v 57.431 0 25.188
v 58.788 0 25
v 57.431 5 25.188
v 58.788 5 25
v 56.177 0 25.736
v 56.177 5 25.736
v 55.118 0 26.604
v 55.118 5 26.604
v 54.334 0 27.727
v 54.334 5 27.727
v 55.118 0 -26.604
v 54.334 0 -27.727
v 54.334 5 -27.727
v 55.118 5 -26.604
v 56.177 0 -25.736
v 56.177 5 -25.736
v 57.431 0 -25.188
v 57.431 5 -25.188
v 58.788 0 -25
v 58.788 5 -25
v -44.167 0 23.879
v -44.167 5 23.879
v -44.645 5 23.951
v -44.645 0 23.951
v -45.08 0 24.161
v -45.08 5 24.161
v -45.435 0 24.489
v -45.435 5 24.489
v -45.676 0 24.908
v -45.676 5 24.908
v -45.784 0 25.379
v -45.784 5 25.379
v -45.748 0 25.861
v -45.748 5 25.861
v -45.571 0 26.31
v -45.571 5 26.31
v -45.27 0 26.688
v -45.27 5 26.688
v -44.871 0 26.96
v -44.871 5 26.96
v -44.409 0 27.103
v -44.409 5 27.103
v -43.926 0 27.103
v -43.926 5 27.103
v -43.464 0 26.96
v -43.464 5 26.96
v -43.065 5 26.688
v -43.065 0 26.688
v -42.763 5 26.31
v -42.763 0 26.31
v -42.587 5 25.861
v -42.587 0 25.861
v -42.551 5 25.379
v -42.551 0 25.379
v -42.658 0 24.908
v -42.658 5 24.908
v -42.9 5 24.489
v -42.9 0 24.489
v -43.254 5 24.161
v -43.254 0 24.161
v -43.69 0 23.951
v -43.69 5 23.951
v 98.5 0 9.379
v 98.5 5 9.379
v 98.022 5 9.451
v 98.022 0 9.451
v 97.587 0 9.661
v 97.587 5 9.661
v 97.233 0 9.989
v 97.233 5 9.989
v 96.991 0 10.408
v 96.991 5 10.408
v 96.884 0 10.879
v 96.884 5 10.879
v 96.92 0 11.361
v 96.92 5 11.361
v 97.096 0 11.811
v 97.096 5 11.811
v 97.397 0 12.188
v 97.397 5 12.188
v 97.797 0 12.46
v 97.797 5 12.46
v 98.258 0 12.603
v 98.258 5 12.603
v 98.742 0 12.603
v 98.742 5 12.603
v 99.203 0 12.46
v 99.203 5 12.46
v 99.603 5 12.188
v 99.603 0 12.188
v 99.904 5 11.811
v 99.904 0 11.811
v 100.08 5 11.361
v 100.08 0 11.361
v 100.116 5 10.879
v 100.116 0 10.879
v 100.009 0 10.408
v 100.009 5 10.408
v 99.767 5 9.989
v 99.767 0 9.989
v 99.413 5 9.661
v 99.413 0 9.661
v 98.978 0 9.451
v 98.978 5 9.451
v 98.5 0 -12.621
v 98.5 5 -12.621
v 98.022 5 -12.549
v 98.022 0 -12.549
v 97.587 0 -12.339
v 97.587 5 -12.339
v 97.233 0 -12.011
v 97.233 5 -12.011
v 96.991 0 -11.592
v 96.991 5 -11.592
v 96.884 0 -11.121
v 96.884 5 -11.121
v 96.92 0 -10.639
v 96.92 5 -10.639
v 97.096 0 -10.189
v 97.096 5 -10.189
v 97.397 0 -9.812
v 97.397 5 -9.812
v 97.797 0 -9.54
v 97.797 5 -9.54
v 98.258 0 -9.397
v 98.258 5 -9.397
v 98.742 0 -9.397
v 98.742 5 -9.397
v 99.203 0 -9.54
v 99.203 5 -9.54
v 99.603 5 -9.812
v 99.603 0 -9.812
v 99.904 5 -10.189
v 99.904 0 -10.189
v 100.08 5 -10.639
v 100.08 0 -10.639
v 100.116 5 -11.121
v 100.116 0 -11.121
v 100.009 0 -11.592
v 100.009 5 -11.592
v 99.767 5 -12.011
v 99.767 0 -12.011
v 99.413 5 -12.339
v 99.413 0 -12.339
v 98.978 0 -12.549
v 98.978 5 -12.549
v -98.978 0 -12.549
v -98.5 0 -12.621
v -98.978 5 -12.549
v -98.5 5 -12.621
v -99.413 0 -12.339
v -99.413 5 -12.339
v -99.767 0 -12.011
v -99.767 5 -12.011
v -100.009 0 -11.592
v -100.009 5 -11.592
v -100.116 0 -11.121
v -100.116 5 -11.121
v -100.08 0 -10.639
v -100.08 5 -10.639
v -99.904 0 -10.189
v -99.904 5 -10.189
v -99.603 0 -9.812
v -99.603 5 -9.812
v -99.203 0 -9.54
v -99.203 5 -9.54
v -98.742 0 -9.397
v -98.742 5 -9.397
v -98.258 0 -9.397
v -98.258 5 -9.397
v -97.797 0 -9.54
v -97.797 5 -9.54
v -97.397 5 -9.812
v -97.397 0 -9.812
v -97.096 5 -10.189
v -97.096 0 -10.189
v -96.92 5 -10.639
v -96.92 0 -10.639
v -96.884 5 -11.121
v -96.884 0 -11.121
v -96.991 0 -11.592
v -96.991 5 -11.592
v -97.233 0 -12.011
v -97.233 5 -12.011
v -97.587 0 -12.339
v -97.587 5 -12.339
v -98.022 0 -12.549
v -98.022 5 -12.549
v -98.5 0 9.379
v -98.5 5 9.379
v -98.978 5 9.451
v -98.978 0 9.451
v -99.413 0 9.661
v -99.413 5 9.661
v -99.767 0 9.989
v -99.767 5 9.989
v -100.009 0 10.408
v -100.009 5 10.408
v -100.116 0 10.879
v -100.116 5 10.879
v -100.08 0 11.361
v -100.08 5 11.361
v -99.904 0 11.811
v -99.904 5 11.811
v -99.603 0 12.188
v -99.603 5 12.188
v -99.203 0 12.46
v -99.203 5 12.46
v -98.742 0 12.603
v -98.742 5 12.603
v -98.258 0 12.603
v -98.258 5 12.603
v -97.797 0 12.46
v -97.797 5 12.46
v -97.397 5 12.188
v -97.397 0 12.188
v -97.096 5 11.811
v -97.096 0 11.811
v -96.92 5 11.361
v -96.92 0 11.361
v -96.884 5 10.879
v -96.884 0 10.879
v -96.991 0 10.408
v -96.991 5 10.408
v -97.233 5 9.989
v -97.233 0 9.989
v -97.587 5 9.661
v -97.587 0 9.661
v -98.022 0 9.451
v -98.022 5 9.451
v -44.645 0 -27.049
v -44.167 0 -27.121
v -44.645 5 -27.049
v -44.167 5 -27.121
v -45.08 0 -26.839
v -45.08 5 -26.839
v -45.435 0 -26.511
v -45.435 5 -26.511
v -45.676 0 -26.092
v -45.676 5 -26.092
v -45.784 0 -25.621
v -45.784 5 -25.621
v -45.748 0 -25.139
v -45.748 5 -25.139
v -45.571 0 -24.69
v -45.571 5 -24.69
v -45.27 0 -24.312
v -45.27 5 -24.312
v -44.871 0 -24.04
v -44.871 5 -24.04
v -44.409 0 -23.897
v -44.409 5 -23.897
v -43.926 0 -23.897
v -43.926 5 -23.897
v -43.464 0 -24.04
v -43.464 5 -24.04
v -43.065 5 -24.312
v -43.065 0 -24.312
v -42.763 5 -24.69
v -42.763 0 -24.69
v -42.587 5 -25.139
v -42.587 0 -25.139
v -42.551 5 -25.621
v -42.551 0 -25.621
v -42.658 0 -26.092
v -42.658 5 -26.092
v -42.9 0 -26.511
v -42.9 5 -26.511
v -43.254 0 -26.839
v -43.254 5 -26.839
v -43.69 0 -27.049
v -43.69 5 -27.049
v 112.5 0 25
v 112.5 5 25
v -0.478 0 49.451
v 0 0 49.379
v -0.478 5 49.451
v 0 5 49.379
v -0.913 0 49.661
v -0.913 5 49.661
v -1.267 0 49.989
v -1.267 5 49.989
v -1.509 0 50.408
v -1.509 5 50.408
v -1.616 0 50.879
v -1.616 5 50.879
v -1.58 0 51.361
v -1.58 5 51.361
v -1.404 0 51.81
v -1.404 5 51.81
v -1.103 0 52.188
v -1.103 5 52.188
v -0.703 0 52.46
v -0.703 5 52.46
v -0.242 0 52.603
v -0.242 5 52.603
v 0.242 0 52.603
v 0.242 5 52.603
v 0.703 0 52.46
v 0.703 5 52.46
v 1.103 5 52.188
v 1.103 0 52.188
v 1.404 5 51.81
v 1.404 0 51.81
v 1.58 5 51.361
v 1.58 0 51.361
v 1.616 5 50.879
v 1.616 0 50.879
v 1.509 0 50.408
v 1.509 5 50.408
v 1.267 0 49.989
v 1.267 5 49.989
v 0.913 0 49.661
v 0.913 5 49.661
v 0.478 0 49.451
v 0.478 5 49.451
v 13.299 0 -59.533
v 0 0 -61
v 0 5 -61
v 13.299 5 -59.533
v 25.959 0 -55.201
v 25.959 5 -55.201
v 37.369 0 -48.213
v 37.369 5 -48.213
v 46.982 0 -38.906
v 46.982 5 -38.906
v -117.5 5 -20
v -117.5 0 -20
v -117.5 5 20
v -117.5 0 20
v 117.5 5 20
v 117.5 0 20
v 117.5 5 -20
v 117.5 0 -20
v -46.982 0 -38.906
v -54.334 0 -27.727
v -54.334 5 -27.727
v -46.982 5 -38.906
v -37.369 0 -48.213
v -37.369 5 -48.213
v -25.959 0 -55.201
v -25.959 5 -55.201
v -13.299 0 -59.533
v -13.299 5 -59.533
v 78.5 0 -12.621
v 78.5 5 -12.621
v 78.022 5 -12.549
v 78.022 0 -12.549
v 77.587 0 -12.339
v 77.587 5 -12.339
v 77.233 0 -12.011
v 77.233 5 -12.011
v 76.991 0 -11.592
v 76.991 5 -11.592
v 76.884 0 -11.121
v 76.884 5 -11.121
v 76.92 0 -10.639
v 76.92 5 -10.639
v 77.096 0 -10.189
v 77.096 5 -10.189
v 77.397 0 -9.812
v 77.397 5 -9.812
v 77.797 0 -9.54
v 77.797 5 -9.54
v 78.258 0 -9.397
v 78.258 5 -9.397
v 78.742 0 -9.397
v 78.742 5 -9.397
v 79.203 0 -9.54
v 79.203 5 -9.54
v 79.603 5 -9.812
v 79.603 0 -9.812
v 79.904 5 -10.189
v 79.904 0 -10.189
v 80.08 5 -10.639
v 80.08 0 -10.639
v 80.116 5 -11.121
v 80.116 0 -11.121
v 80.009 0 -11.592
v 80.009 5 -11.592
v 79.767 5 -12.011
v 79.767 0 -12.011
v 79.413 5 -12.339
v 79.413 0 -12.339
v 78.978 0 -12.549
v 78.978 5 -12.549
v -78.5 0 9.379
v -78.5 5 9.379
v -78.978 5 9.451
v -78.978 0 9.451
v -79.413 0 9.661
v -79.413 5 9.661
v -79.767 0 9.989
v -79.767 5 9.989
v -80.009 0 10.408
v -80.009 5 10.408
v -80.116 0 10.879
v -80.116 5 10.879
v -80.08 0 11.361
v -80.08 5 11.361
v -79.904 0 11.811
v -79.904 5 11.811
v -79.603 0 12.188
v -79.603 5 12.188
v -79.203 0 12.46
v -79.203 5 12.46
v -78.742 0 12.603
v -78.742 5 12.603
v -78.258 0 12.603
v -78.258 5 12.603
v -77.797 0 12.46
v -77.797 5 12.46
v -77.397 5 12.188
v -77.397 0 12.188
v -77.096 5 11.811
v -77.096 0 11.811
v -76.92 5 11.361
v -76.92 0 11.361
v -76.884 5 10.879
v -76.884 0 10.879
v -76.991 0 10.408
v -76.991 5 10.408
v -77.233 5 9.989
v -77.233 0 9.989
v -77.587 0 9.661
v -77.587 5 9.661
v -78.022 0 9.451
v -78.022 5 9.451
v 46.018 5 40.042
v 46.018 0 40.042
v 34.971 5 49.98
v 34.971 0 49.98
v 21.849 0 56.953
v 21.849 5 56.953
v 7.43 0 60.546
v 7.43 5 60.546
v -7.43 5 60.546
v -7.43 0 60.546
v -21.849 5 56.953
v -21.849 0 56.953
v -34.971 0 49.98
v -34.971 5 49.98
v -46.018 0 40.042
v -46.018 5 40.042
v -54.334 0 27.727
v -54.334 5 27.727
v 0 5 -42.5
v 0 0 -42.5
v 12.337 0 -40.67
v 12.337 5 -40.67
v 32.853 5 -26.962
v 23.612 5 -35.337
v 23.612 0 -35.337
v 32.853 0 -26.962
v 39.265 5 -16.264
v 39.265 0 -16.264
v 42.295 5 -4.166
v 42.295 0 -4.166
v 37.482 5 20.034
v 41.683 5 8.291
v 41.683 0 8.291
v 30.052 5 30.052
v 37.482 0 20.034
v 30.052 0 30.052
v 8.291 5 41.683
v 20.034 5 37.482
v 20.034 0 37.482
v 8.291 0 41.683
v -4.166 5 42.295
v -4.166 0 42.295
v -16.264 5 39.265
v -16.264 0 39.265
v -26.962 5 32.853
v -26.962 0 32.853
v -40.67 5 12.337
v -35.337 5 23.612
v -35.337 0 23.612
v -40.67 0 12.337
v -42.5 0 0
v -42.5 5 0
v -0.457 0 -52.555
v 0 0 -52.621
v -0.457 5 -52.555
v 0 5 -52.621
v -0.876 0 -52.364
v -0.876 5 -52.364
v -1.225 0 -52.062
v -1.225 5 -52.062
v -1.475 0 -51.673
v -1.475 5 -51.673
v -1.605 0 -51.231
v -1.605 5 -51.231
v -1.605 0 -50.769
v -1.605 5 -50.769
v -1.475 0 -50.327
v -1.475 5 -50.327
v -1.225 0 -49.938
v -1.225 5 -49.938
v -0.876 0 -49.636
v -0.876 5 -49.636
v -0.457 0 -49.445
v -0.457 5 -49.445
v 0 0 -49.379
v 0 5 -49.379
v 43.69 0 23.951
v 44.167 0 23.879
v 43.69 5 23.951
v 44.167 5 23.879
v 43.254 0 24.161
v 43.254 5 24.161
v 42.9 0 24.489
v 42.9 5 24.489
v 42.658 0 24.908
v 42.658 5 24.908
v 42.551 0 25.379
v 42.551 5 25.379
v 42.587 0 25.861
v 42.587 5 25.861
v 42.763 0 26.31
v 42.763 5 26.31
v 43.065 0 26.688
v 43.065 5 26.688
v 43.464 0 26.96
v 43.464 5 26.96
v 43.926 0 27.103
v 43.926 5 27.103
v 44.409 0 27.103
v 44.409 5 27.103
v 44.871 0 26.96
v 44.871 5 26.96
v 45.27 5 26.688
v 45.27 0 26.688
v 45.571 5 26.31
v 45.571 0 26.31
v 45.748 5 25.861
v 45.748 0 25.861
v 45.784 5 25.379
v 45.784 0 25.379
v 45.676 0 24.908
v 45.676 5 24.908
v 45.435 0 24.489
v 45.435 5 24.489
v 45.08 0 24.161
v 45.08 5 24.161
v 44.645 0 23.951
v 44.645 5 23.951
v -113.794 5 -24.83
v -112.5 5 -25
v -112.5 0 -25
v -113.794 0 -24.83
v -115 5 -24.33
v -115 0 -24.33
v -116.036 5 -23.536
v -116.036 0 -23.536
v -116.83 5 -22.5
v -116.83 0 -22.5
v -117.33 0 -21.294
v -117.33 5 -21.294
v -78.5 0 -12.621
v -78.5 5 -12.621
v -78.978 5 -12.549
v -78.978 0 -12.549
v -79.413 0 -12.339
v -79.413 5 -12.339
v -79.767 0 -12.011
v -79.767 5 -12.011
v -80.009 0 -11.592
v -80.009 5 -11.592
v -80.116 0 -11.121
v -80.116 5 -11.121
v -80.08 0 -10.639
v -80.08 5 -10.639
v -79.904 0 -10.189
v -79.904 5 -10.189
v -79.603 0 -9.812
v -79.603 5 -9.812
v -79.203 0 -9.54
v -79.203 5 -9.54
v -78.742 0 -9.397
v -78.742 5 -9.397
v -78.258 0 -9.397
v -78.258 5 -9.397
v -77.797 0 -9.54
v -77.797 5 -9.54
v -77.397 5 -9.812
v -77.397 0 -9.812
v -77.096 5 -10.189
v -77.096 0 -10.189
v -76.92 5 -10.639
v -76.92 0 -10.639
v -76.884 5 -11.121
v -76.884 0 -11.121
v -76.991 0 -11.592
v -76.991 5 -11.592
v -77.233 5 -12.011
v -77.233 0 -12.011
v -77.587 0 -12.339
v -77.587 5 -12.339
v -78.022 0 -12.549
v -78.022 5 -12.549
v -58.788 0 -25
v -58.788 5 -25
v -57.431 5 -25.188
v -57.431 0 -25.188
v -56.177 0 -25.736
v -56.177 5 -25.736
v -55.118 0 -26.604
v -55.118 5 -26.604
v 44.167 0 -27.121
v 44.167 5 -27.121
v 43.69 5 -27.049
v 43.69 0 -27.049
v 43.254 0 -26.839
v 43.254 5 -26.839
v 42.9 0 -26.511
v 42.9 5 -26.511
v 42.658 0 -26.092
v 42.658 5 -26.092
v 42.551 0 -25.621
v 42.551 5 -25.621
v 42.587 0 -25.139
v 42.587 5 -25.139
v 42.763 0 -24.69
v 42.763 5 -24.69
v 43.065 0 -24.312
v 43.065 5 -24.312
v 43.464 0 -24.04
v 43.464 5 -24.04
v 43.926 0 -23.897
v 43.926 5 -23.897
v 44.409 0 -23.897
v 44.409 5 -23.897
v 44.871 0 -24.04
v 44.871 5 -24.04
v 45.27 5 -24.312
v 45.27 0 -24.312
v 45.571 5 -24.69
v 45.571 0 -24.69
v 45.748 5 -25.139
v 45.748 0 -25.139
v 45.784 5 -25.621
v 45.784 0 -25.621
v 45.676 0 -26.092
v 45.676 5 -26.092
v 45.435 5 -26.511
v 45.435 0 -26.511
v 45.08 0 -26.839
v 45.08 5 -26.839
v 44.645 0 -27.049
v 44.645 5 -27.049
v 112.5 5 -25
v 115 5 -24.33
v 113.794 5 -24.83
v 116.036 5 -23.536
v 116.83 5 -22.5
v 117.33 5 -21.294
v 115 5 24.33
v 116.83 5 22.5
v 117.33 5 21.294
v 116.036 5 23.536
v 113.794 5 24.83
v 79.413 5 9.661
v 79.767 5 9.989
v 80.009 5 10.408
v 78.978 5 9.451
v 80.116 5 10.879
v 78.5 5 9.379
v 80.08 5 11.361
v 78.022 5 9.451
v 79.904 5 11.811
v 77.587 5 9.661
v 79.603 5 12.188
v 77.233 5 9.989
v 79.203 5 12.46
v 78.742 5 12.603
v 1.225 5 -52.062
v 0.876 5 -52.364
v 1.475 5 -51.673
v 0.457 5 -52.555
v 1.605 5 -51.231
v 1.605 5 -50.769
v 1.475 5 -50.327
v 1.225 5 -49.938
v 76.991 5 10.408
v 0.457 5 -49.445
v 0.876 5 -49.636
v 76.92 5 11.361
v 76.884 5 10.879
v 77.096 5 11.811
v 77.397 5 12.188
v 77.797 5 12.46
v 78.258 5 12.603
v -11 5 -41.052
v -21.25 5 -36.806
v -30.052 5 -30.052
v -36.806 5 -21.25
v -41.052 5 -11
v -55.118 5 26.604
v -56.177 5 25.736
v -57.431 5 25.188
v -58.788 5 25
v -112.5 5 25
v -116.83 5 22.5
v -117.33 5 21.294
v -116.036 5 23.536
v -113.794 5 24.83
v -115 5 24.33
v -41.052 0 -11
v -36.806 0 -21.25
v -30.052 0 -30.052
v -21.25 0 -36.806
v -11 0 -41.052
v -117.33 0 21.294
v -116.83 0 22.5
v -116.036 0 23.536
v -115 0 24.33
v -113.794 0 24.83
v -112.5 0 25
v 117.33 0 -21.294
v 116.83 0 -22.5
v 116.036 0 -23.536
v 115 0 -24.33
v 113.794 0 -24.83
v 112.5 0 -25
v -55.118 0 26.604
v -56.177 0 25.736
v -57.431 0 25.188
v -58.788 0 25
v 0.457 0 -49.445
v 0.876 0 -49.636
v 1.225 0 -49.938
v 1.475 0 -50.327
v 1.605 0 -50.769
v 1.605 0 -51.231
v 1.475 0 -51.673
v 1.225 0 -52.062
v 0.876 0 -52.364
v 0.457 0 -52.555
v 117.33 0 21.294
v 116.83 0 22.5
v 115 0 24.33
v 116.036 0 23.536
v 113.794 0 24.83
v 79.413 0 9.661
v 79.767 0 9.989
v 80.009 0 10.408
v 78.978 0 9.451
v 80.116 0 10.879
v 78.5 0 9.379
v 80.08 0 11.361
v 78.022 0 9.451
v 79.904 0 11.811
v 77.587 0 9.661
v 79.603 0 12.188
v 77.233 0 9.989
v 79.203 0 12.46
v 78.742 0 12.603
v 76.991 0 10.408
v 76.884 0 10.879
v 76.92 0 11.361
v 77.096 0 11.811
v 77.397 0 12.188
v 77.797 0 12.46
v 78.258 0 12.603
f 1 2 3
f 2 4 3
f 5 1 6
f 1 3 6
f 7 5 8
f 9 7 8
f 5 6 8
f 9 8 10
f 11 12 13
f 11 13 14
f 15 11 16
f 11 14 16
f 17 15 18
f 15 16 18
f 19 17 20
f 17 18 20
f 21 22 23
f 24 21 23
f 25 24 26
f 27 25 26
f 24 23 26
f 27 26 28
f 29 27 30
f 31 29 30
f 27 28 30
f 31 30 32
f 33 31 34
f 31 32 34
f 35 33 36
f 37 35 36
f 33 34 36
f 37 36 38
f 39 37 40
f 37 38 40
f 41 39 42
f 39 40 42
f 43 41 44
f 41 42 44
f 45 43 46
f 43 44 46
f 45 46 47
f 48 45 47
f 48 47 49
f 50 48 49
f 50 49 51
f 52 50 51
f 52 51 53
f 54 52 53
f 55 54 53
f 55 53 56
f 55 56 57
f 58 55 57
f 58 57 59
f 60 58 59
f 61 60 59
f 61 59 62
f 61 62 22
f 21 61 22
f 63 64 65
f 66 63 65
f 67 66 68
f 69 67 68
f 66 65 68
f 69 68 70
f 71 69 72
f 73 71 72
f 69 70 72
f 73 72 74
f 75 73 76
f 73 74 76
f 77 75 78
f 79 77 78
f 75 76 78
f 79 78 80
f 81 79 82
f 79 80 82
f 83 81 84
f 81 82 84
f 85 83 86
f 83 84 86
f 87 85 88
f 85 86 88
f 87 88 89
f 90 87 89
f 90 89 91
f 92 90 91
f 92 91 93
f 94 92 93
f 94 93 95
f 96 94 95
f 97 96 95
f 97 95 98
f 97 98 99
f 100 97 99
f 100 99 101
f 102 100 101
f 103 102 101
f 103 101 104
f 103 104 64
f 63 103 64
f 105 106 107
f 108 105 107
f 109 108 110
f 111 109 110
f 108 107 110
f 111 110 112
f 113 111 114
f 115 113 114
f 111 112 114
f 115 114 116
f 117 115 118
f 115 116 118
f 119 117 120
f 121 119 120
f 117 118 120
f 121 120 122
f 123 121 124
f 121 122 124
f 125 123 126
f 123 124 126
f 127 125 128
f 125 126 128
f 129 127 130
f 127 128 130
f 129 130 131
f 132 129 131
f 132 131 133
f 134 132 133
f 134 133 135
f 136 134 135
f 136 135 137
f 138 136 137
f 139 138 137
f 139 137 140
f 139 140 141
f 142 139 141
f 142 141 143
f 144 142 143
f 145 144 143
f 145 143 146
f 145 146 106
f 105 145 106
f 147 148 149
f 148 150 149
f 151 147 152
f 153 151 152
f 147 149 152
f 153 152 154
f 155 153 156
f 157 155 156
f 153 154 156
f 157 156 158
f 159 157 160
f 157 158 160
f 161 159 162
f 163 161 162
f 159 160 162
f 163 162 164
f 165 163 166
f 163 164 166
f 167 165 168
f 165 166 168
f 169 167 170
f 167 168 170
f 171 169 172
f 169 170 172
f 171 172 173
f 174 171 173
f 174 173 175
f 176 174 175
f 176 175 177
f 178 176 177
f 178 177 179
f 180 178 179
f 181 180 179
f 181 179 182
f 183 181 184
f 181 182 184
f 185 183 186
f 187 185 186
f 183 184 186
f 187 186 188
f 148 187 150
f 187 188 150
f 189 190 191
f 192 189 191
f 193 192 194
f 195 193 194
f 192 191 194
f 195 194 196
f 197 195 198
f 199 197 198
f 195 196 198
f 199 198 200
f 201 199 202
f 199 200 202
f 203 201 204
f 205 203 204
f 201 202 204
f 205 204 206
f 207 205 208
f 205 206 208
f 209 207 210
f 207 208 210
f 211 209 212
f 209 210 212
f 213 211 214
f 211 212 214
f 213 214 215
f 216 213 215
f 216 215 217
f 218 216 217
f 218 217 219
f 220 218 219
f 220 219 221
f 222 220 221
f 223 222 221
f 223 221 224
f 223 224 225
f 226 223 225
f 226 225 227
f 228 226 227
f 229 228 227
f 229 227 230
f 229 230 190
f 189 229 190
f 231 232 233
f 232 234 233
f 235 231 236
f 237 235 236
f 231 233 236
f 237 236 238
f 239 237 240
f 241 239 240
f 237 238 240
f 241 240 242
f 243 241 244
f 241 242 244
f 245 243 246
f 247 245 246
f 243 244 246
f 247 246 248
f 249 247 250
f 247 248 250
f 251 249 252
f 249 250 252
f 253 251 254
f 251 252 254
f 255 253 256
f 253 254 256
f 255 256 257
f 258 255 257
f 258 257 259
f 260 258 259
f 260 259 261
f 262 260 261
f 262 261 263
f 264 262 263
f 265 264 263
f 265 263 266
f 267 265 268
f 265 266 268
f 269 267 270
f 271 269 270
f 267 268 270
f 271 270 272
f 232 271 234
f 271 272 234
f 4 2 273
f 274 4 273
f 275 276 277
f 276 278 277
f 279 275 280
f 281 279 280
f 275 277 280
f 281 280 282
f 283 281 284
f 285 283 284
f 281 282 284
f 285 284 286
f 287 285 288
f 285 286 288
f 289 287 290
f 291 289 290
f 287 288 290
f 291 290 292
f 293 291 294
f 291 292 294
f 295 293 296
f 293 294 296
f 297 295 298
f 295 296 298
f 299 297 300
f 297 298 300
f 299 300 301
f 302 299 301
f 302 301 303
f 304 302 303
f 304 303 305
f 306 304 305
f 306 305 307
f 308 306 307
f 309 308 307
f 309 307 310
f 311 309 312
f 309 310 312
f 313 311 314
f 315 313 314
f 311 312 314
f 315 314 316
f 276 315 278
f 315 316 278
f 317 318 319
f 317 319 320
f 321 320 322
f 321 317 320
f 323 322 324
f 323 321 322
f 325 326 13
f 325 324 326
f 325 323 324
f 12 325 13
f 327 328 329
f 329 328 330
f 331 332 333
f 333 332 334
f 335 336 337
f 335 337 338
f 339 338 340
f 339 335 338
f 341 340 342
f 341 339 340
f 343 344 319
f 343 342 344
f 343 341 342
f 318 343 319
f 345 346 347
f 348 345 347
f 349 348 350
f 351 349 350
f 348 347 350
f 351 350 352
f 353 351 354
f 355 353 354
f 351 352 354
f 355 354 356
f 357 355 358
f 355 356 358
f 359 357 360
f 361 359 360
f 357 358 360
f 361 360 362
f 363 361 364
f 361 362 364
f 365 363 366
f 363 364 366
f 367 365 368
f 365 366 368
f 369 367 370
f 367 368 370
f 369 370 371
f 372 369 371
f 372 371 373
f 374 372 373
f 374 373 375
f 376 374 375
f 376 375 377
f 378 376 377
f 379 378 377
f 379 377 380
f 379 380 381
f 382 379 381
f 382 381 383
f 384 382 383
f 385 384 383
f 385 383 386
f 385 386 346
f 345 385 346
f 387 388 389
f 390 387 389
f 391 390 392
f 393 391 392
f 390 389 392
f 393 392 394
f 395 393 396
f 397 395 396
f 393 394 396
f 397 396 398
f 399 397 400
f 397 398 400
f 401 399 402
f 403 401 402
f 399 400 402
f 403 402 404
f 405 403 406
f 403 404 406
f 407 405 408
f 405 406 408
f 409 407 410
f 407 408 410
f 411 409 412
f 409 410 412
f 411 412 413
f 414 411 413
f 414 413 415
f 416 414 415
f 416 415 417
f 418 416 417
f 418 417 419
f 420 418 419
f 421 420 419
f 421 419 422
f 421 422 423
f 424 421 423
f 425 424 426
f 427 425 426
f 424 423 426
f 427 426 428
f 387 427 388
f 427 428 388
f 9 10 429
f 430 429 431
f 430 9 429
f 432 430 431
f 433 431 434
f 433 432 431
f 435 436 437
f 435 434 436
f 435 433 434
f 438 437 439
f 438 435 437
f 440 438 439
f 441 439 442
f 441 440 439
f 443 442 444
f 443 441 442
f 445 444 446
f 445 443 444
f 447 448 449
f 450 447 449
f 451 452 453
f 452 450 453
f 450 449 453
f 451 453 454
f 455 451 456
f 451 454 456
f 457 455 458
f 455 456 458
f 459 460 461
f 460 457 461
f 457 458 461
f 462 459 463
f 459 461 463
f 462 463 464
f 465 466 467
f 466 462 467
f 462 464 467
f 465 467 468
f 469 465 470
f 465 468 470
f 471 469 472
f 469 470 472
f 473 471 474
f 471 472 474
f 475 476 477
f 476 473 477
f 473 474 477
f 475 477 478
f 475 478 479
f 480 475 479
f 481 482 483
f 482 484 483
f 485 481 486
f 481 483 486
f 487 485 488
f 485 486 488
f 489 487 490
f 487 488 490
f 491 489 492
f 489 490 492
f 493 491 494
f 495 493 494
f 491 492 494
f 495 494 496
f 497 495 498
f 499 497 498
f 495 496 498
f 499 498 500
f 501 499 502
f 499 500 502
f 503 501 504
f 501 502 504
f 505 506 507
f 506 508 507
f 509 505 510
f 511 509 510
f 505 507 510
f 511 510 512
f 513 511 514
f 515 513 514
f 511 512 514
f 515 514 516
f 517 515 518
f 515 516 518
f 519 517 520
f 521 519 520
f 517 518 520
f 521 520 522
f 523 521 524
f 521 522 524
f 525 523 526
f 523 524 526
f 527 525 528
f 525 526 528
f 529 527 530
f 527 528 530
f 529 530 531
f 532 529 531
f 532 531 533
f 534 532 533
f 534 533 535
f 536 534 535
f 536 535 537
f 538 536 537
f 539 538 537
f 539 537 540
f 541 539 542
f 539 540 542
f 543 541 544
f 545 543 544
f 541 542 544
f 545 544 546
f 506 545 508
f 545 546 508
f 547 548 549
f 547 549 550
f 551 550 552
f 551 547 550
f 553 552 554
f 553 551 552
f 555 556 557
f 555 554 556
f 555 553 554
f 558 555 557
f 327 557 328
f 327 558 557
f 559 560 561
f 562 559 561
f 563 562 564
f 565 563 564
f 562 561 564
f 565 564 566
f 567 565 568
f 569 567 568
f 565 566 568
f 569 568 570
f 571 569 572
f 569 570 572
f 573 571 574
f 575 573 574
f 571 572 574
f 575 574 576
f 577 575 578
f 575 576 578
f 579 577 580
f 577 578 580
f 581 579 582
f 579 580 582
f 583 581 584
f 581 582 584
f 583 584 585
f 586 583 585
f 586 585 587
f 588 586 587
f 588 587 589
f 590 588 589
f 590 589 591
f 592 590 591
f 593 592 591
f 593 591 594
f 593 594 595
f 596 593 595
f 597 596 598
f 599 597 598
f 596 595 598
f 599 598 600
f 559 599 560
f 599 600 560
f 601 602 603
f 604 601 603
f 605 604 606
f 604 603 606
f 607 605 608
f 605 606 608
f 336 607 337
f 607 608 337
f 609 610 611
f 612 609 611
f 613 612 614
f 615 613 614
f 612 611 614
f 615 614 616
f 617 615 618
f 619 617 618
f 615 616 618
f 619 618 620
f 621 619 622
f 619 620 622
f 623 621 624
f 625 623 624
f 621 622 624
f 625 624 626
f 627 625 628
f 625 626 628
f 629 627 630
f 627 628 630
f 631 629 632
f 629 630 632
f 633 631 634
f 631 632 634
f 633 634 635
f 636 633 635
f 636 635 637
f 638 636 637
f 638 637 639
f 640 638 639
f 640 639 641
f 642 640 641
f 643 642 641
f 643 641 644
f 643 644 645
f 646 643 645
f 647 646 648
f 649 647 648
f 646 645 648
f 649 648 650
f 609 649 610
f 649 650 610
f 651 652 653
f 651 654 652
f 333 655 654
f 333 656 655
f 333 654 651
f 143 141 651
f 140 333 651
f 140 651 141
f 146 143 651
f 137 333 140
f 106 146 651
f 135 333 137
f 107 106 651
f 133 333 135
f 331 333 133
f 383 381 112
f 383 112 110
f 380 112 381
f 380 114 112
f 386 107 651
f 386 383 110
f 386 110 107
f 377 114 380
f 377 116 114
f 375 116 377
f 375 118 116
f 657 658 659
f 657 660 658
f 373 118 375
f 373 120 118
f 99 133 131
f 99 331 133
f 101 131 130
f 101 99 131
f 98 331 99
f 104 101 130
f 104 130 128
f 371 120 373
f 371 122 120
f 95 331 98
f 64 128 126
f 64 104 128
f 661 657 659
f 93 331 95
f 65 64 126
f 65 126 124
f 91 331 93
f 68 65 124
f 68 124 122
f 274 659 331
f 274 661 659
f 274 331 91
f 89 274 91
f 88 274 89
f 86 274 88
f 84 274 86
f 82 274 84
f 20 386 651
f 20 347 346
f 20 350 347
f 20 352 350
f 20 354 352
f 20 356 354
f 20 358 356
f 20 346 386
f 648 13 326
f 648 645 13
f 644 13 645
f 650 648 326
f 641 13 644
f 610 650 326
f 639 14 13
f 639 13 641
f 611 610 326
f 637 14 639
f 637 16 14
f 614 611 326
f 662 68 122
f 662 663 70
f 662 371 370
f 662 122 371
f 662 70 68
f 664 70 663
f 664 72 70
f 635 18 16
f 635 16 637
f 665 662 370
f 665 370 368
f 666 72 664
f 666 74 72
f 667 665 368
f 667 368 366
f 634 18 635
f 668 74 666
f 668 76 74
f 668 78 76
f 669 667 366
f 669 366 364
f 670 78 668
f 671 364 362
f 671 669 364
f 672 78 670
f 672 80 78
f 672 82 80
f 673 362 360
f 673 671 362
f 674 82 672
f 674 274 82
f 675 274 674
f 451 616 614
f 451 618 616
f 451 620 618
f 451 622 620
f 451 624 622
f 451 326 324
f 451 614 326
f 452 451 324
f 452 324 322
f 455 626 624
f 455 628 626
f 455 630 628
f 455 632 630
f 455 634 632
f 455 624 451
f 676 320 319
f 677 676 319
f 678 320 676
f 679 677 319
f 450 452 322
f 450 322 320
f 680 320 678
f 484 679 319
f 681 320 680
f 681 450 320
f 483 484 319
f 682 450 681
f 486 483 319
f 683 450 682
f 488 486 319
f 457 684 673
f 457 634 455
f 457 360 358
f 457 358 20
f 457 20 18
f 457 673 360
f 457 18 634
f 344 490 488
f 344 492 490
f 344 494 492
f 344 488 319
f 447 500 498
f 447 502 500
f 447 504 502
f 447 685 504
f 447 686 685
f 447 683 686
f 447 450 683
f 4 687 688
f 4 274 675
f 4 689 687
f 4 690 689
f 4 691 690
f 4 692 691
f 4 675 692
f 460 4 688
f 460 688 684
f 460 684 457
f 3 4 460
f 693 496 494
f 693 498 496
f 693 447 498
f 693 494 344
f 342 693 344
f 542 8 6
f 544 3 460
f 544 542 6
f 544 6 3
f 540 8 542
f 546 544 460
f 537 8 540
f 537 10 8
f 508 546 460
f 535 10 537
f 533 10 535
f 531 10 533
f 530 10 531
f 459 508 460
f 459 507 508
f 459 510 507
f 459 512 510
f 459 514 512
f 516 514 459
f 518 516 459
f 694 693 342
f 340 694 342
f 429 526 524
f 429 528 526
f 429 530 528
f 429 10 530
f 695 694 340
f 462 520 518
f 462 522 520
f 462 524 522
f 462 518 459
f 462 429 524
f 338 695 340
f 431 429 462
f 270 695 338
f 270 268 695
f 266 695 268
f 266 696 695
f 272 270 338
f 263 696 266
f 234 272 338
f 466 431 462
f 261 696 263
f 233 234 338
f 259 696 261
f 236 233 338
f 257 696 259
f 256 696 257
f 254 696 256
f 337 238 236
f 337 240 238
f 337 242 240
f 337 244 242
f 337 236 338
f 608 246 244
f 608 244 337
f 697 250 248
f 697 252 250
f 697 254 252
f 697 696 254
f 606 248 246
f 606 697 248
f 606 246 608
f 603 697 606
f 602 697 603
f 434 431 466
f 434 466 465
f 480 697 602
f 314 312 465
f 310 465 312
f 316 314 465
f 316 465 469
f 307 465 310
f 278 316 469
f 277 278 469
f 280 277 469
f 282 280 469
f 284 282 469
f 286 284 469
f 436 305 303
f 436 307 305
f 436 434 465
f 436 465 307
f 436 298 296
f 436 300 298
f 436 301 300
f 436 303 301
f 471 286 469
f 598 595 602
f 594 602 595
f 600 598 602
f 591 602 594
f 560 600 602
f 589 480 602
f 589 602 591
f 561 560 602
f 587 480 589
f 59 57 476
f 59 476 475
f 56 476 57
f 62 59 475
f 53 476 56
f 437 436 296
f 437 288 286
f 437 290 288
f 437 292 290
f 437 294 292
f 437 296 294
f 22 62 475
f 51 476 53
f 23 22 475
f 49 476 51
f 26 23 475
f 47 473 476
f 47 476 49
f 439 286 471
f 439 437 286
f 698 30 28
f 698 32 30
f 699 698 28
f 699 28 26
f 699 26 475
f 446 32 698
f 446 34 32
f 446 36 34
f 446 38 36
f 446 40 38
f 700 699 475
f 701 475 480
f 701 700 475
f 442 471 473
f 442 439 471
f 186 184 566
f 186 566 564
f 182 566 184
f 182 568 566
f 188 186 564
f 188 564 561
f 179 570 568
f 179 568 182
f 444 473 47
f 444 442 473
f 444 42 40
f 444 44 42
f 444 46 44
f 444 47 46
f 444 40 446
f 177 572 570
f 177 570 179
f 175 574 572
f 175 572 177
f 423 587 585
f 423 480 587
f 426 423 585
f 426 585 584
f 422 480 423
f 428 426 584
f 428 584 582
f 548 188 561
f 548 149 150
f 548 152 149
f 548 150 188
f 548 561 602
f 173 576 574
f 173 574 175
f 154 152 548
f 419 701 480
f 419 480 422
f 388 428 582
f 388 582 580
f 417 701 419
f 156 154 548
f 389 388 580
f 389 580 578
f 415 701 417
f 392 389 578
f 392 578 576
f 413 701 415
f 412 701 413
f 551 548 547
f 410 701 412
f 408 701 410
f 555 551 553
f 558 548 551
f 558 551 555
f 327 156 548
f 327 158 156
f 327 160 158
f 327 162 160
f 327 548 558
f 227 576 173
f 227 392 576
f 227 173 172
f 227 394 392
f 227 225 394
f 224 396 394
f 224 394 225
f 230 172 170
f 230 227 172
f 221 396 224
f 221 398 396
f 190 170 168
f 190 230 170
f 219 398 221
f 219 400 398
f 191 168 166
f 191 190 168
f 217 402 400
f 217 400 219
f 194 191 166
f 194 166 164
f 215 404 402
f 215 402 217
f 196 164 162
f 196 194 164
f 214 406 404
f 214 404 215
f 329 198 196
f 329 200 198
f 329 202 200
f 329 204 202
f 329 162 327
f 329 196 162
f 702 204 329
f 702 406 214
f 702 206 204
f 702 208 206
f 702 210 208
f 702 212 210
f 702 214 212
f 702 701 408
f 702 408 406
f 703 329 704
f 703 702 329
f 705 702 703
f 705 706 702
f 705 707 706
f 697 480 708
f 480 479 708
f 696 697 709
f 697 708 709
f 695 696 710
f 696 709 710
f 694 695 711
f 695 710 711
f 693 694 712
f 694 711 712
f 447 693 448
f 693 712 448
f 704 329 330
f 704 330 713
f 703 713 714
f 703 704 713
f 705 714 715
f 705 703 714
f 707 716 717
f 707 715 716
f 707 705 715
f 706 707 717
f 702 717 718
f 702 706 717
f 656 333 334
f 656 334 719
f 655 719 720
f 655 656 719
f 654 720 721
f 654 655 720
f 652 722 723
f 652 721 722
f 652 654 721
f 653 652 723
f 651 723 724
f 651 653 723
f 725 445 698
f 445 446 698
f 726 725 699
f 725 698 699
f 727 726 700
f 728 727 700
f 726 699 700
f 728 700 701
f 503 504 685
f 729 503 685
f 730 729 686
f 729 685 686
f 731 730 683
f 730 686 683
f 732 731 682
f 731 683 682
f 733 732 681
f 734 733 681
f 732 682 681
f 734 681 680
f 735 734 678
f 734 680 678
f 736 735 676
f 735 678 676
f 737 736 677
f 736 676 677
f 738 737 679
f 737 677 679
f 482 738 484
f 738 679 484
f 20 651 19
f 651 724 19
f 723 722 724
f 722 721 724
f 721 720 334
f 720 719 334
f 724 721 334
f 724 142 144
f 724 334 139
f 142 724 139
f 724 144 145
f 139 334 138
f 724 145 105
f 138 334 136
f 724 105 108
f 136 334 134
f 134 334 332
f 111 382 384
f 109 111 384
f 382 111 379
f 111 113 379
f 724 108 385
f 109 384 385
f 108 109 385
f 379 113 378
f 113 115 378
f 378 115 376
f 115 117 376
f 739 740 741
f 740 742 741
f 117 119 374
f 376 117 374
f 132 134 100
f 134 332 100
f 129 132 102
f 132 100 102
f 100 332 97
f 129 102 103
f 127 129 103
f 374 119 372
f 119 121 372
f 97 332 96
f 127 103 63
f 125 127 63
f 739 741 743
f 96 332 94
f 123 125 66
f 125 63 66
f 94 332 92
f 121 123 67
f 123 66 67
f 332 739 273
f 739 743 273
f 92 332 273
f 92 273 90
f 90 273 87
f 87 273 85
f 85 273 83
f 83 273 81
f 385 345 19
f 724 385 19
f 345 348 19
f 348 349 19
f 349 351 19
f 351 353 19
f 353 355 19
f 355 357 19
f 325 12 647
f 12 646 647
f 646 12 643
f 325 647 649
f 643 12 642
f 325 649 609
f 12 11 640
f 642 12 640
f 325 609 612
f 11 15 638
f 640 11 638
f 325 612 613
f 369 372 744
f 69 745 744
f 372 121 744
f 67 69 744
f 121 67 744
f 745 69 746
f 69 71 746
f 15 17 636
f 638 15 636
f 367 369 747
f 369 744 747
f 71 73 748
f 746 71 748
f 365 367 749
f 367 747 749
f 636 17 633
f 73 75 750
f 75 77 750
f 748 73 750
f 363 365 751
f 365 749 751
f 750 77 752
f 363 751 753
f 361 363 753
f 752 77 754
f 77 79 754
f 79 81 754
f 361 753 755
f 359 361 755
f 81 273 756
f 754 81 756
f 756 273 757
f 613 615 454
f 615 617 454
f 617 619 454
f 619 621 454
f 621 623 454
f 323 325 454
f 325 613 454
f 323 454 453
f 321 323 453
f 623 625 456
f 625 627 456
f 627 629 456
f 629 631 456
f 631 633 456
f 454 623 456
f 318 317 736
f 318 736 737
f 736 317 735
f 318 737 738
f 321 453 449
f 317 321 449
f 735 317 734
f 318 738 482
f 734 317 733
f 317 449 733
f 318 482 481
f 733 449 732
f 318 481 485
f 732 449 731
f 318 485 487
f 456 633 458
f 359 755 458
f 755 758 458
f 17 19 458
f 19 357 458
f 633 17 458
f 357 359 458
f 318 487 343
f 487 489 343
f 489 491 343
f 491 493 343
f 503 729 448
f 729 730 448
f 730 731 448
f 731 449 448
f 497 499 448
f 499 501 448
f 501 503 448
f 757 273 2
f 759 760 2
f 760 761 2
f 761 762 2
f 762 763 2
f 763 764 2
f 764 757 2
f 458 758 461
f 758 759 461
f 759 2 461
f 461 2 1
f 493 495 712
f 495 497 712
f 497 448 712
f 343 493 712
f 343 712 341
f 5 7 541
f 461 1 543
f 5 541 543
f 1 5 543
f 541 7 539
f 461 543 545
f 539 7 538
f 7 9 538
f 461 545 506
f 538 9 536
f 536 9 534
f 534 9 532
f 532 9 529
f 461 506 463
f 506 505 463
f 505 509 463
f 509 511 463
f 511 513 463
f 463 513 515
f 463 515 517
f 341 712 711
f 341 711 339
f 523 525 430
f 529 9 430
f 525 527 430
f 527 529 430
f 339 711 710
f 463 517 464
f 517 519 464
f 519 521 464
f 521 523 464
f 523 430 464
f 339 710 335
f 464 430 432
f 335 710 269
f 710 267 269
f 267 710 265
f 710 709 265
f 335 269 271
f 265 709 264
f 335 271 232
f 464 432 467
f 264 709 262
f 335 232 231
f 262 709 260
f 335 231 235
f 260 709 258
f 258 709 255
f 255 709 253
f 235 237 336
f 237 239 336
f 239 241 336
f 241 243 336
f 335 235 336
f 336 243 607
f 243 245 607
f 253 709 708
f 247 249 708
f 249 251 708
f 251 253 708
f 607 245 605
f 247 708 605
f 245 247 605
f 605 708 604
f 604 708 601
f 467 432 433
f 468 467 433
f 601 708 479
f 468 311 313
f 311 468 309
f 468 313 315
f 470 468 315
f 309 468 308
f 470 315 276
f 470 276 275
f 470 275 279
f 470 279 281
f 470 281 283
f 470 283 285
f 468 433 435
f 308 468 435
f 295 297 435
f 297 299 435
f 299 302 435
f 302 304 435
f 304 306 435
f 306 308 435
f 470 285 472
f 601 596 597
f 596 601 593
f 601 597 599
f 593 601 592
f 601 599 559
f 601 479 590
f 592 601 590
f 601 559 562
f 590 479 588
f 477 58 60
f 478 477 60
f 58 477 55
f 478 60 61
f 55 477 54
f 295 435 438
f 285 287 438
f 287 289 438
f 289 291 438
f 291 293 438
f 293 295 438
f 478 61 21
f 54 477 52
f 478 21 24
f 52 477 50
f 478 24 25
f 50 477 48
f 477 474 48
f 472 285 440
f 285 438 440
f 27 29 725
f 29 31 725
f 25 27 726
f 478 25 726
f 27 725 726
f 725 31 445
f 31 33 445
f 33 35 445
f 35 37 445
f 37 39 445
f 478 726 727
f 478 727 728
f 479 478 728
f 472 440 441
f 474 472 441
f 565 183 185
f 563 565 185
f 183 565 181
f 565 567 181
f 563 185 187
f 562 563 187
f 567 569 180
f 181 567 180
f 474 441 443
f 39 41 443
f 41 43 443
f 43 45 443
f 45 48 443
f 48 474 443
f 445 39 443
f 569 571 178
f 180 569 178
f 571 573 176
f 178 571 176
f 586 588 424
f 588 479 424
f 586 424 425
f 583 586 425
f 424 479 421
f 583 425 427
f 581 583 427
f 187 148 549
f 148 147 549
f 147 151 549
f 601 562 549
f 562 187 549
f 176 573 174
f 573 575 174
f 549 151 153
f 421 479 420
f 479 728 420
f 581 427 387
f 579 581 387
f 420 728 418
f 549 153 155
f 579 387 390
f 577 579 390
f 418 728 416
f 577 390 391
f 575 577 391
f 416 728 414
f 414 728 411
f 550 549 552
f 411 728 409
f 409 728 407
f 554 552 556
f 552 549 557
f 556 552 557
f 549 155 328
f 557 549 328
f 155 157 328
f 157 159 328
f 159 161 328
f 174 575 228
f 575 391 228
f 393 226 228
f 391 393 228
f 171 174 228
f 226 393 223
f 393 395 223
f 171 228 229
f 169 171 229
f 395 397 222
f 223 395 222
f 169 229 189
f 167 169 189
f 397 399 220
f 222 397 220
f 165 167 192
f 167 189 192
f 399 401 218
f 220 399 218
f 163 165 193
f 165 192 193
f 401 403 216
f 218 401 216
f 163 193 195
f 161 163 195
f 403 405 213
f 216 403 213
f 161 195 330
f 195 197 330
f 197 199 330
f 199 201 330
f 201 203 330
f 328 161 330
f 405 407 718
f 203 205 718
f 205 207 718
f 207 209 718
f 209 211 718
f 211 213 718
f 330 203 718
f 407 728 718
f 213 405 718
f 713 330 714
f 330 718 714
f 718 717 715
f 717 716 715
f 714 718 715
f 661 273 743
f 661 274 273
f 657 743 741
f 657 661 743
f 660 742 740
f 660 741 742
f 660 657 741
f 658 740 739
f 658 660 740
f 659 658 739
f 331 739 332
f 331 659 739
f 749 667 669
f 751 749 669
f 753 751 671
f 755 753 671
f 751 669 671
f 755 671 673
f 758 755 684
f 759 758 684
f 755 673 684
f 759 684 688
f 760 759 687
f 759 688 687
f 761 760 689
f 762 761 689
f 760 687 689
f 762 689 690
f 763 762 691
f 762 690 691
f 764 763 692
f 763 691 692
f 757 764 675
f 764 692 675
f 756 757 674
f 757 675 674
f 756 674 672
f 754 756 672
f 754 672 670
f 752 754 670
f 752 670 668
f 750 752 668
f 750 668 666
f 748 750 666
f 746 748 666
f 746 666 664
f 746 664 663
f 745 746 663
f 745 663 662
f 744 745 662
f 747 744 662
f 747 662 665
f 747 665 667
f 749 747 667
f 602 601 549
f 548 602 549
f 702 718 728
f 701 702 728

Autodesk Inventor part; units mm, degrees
ref_plane "YZ Plane" through (0, 0, 0) normal (1, 0, 0) x (0, 1, 0)
ref_plane "XZ Plane" through (0, 0, 0) normal (0, 1, 0) x (-1, 0, 0)
ref_plane "XY Plane" through (0, 0, 0) normal (0, 0, 1) x (1, 0, 0)
sketch "Sketch1" plane through (0, 0, 0) normal (0, 1, 0) x (-1, 0, 0)
  circle A0 centre (0, 0) radius 42.5
  arc A1 (55.6417, 25) -> (-55.6417, 25) centre (0, 0) ccw
  line L0 (0, 0) -> (0, -61)
  line L1 (0, 0) -> (0, 0)
  line L2 (0, 0) -> (0, -90.4875)
  line L3 (-117.5, 25) -> (-117.5, -25)
  line L4 (117.5, -25) -> (117.5, 25)
  line L5 (117.5, 25) -> (-117.5, -25) construction
  line L6 (-117.5, 25) -> (117.5, -25) construction
  line L7 (117.5, 25) -> (55.6417, 25)
  line L8 (-55.6417, 25) -> (-117.5, 25)
  line L9 (55.6417, -25) -> (117.5, -25)
  line L10 (-117.5, -25) -> (-55.6417, -25)
  arc A2 (-55.6417, -25) -> (55.6417, -25) centre (0, 0) ccw
  dimension "d0" = 85
  dimension "d29" = 61
  dimension "d46" = 235
  dimension "d47" = 50
extrude "Extrusion1" add sketch "Sketch1" along normal blind 5
sketch "Sketch2" plane through (0, 0, 0) normal (0, -1, 0) x (1, 0, 0)
  line L0 (-117.5, -25) -> (-117.5, 25) projected
  line L1 (-117.5, 0) -> (117.5, 0)
  line L2 (117.5, 25) -> (117.5, -25) projected
  arc A0 (55.6417, 25) -> (-55.6417, 25) centre (0, 0) ccw projected
  line L3 (0, 61) -> (0, -61)
  arc A1 (-55.6417, -25) -> (55.6417, -25) centre (0, 0) ccw projected
  circle A2 centre (-98.5, 11) radius 2
  line L4 (-117.5, 25) -> (-55.6417, 25) projected
  circle A3 centre (-78.5, 11) radius 2
  circle A4 centre (-98.5, -11) radius 2
  circle A5 centre (-78.5, -11) radius 2
  circle A6 centre (98.5, 11) radius 2
  circle A7 centre (78.5, 11) radius 2
  circle A8 centre (98.5, -11) radius 2
  circle A9 centre (78.5, -11) radius 2
  dimension "d51" = 4
  dimension "d52" = 19
  dimension "d53" = 14
  dimension "d54" = 4
  dimension "d55" = 20
hole "Hole1" at (-98.5, 0, 11) at (-78.5, 0, 11) at (-78.5, 0, -11) at (-98.5, 0, -11) at (78.5, 0, 11) at (98.5, 0, 11) at (98.5, 0, -11) at (78.5, 0, -11) direction (0, 1, 0) diameter 3.242 depth 11.8 tip angle 118 thread size "M4x0.7" class "6H" standard "ANSI Metric M Profile"
sketch "Sketch3" plane through (0, 0, 0) normal (0, -1, 0) x (1, 0, 0)
  circle A0 centre (0, 0) radius 51
  circle A1 centre (0, 51) radius 2
  circle A2 centre (-44.1673, 25.5) radius 2
  circle A3 centre (-44.1673, -25.5) radius 2
  circle A4 centre (0, -51) radius 2
  circle A5 centre (44.1673, -25.5) radius 2
  circle A6 centre (44.1673, 25.5) radius 2
  dimension "d33" = 102
  dimension "d34" = 4
  dimension "d37" = 360
hole "Hole2" at (0, 0, 51) at (44.1673, 0, 25.5) at (44.1673, 0, -25.5) at (0, 0, -51) at (-44.1673, 0, -25.5) at (-44.1673, 0, 25.5) direction (0, 1, 0) diameter 3.242 depth 11.8 tip angle 118 thread size "M4x0.7" class "6H" standard "ANSI Metric M Profile"
fillet "Fillet2" radius 5 8 edges at (-117.5, 2.5, -25) (-55.6417, 2.5, -25) (117.5, 2.5, -25) (55.6417, 2.5, -25) (117.5, 2.5, 25) (55.6417, 2.5, 25) (-55.6417, 2.5, 25) (-117.5, 2.5, 25)
properties part number "Head Thing (metal)"
